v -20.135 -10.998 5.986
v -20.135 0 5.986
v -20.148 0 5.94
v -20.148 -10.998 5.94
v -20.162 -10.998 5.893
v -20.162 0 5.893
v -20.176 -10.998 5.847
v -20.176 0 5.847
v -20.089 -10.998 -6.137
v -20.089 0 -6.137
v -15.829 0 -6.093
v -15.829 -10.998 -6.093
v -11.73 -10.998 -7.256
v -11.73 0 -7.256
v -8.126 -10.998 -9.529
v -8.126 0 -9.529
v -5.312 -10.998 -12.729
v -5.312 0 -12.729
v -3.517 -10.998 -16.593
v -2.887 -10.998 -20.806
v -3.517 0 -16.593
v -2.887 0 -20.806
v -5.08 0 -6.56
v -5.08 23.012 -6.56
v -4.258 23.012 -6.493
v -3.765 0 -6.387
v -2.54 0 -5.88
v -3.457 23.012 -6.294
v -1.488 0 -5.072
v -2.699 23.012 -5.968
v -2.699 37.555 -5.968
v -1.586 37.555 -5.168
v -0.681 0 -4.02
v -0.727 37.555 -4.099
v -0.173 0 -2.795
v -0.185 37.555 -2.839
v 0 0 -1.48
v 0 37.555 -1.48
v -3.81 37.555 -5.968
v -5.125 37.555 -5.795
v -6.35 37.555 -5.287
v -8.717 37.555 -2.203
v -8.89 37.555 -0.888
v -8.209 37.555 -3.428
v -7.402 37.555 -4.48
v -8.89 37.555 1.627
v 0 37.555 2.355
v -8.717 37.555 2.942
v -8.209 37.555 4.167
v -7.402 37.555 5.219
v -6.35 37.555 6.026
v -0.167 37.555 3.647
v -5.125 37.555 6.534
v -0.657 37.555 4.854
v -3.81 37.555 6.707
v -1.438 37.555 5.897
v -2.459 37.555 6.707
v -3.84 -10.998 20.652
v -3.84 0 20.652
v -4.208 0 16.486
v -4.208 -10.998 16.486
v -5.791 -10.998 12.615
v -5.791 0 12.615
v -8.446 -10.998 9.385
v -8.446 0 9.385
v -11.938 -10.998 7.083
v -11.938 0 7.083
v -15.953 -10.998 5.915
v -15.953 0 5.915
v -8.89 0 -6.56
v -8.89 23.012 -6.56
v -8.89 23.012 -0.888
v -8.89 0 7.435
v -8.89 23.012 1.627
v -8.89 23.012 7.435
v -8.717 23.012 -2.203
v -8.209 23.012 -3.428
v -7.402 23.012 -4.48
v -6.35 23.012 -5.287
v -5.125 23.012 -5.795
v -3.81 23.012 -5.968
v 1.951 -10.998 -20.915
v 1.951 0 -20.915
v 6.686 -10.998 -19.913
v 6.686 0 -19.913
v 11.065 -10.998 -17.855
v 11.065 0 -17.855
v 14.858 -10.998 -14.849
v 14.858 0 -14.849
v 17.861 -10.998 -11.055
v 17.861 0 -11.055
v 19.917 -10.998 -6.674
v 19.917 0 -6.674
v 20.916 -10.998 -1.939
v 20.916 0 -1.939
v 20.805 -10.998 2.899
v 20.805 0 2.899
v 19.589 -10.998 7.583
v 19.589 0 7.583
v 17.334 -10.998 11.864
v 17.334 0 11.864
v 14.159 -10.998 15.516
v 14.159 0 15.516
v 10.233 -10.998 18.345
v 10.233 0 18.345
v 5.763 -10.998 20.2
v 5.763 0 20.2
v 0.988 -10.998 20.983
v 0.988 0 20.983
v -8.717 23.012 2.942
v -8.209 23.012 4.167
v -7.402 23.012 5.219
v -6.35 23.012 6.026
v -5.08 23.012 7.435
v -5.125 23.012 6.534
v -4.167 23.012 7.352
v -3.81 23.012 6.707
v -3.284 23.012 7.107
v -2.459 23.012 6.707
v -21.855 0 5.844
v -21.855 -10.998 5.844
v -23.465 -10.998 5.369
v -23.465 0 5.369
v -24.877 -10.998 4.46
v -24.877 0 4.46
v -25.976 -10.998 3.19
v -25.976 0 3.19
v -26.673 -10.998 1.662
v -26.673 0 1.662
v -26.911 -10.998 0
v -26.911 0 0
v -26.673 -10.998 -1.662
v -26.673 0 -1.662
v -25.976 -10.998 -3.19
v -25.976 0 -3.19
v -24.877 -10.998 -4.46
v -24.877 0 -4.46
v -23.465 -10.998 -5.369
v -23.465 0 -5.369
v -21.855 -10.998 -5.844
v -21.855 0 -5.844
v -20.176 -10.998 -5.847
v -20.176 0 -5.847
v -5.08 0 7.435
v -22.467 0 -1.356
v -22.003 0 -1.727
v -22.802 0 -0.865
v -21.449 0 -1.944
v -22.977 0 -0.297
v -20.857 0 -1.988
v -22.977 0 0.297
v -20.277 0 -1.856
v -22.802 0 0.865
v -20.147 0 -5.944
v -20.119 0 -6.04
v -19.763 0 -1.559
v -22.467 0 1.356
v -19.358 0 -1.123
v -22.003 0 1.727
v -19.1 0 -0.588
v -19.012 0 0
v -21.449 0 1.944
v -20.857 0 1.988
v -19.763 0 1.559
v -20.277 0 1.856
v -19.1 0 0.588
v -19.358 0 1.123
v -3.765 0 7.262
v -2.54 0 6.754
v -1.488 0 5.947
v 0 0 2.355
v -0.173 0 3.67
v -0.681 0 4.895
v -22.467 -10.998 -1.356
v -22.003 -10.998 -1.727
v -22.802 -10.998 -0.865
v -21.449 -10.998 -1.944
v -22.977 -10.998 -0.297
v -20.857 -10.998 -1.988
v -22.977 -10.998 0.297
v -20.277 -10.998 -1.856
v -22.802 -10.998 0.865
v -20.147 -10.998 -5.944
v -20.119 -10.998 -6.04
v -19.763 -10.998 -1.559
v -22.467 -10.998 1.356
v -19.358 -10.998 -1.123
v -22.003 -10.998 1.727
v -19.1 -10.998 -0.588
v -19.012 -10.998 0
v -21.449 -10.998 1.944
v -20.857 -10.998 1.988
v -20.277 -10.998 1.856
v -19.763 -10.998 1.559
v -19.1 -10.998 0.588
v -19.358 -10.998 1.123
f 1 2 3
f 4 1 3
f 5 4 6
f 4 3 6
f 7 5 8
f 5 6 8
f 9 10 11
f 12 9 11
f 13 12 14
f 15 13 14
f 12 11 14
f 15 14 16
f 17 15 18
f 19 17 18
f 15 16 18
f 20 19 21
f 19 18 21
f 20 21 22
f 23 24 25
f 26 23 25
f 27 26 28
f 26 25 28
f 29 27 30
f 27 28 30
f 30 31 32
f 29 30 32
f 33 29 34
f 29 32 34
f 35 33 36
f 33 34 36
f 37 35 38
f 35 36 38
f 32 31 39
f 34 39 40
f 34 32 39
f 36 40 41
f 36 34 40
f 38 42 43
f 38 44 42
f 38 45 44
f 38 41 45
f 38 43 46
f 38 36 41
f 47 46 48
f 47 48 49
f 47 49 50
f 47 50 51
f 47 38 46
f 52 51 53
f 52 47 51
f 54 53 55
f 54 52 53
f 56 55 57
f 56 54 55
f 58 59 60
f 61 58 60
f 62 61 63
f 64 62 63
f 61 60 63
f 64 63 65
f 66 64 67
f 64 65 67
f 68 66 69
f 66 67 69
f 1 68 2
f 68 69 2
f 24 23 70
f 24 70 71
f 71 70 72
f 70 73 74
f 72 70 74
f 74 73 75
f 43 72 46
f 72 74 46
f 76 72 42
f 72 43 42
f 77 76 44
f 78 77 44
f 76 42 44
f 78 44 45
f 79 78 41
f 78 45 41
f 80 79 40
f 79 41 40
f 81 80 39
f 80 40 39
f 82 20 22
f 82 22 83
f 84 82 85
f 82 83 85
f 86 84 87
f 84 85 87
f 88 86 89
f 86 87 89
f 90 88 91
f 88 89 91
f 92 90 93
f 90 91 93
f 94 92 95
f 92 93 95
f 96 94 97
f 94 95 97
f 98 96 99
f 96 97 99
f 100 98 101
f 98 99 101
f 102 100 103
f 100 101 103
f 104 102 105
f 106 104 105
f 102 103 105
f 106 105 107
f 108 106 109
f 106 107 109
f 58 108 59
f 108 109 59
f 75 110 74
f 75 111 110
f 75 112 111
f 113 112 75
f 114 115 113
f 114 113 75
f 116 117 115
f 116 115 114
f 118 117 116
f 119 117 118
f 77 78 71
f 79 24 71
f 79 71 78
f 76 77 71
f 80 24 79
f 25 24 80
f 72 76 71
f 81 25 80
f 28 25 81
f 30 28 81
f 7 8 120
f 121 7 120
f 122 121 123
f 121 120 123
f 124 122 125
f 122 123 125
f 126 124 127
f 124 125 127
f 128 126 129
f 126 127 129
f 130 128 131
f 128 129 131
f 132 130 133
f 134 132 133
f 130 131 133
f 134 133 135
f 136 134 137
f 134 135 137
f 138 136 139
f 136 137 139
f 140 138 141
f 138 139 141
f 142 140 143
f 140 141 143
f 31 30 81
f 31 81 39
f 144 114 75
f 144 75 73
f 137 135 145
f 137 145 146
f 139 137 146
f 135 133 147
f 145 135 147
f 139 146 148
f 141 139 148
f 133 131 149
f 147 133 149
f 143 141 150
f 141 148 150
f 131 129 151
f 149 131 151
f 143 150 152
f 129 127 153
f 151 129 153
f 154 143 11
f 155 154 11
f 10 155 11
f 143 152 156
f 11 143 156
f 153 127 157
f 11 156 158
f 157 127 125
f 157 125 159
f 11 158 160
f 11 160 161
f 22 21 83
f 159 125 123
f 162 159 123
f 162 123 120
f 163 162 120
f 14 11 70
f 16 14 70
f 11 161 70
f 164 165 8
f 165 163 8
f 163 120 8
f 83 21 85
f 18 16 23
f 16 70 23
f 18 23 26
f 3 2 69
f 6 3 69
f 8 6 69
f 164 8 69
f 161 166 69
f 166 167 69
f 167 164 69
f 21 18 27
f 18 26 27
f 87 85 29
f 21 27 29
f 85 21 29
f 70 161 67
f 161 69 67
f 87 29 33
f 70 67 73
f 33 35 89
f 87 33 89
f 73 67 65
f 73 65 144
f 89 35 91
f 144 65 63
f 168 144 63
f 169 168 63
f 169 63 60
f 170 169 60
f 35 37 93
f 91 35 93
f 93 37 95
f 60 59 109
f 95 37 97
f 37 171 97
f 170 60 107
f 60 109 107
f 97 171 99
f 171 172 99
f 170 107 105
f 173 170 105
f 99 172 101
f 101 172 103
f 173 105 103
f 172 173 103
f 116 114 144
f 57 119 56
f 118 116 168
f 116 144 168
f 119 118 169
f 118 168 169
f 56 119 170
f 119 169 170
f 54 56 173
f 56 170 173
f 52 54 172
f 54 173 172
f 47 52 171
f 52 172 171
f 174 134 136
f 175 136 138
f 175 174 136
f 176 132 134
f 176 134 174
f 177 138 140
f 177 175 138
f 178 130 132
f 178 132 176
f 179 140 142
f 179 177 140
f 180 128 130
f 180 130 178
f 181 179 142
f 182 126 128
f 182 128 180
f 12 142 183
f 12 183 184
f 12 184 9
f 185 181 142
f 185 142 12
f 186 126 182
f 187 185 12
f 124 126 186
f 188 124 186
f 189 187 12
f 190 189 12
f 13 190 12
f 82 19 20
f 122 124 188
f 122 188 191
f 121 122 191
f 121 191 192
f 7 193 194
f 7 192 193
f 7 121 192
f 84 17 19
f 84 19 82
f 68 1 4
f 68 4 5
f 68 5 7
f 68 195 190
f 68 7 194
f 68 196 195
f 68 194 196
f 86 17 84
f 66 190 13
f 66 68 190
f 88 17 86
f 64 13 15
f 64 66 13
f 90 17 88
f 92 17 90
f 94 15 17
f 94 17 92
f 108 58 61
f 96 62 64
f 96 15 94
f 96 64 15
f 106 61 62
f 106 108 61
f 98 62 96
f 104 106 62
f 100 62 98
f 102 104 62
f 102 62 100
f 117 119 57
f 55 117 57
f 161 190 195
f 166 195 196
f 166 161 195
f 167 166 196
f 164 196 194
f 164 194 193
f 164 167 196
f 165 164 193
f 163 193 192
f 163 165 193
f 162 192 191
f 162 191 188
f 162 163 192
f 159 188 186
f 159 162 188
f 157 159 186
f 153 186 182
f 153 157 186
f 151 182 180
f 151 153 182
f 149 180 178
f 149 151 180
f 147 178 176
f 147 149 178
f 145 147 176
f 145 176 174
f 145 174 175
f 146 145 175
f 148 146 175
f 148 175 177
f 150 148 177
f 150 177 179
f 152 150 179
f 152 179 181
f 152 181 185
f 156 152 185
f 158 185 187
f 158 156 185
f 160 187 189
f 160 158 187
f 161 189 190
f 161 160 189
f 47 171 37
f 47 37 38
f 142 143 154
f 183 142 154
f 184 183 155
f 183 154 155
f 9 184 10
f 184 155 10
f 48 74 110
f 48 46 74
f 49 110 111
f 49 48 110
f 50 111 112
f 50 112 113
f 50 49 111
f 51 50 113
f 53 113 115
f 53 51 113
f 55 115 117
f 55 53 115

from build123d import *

# Parameters (mm, degrees)
F0_R     = 1.9939
F1_DEPTH = 10.9982
F2_W     = 14.542134
F2_H     = 12.6746
F3_DEPTH = 8.89
F4_R     = 5.08


with BuildPart() as f1:
    # F0 (on Front) → F1 (new body)
    with BuildSketch(Plane.XZ):
        with BuildLine():
            ThreePointArc((-20.13472, 5.986373), (-20.155318, 5.916654), (-20.175674, 5.846864))
            ThreePointArc((-20.175674, 5.846864), (-26.9113, 0), (-20.175674, -5.846864))
            ThreePointArc((-20.175674, -5.846864), (-20.133047, -5.992), (-20.089376, -6.136825))
            ThreePointArc((-20.089376, -6.136825), (-8.126305, -9.529423), (-2.886791, -20.806491))
            ThreePointArc((-2.886791, -20.806491), (21.000248, 0.482945), (-3.840213, 20.651789))
            ThreePointArc((-3.840213, 20.651789), (-8.446323, 9.384574), (-20.13472, 5.986373))
        make_face()
        with Locations((-21.0058, 0)):
            Circle(F0_R, mode=Mode.SUBTRACT)
    extrude(amount=F1_DEPTH)

    # F2 (on Right) → F3 (join)
    with BuildSketch(Plane.YZ):
        Polygon((0, 7.435056), (0, -6.560344), (23.0124, -6.560344), (23.0124, -5.96783), (23.0124, 6.70677), (23.0124, 7.435056), align=None)
        with Locations((30.283467, 0.36947)):
            Rectangle(F2_W, F2_H)
    extrude(amount=-F3_DEPTH)

    # F4
    f4_edges = [f1.edges().sort_by_distance(p)[0] for p in [
        (0, 11.5062, 7.435056),
        (0, 11.5062, -6.560344),
        (-8.89, 30.283467, 6.70677),
        (-8.89, 30.283467, -5.96783),
    ]]
    fillet(f4_edges, radius=F4_R)


solid = f1.part
